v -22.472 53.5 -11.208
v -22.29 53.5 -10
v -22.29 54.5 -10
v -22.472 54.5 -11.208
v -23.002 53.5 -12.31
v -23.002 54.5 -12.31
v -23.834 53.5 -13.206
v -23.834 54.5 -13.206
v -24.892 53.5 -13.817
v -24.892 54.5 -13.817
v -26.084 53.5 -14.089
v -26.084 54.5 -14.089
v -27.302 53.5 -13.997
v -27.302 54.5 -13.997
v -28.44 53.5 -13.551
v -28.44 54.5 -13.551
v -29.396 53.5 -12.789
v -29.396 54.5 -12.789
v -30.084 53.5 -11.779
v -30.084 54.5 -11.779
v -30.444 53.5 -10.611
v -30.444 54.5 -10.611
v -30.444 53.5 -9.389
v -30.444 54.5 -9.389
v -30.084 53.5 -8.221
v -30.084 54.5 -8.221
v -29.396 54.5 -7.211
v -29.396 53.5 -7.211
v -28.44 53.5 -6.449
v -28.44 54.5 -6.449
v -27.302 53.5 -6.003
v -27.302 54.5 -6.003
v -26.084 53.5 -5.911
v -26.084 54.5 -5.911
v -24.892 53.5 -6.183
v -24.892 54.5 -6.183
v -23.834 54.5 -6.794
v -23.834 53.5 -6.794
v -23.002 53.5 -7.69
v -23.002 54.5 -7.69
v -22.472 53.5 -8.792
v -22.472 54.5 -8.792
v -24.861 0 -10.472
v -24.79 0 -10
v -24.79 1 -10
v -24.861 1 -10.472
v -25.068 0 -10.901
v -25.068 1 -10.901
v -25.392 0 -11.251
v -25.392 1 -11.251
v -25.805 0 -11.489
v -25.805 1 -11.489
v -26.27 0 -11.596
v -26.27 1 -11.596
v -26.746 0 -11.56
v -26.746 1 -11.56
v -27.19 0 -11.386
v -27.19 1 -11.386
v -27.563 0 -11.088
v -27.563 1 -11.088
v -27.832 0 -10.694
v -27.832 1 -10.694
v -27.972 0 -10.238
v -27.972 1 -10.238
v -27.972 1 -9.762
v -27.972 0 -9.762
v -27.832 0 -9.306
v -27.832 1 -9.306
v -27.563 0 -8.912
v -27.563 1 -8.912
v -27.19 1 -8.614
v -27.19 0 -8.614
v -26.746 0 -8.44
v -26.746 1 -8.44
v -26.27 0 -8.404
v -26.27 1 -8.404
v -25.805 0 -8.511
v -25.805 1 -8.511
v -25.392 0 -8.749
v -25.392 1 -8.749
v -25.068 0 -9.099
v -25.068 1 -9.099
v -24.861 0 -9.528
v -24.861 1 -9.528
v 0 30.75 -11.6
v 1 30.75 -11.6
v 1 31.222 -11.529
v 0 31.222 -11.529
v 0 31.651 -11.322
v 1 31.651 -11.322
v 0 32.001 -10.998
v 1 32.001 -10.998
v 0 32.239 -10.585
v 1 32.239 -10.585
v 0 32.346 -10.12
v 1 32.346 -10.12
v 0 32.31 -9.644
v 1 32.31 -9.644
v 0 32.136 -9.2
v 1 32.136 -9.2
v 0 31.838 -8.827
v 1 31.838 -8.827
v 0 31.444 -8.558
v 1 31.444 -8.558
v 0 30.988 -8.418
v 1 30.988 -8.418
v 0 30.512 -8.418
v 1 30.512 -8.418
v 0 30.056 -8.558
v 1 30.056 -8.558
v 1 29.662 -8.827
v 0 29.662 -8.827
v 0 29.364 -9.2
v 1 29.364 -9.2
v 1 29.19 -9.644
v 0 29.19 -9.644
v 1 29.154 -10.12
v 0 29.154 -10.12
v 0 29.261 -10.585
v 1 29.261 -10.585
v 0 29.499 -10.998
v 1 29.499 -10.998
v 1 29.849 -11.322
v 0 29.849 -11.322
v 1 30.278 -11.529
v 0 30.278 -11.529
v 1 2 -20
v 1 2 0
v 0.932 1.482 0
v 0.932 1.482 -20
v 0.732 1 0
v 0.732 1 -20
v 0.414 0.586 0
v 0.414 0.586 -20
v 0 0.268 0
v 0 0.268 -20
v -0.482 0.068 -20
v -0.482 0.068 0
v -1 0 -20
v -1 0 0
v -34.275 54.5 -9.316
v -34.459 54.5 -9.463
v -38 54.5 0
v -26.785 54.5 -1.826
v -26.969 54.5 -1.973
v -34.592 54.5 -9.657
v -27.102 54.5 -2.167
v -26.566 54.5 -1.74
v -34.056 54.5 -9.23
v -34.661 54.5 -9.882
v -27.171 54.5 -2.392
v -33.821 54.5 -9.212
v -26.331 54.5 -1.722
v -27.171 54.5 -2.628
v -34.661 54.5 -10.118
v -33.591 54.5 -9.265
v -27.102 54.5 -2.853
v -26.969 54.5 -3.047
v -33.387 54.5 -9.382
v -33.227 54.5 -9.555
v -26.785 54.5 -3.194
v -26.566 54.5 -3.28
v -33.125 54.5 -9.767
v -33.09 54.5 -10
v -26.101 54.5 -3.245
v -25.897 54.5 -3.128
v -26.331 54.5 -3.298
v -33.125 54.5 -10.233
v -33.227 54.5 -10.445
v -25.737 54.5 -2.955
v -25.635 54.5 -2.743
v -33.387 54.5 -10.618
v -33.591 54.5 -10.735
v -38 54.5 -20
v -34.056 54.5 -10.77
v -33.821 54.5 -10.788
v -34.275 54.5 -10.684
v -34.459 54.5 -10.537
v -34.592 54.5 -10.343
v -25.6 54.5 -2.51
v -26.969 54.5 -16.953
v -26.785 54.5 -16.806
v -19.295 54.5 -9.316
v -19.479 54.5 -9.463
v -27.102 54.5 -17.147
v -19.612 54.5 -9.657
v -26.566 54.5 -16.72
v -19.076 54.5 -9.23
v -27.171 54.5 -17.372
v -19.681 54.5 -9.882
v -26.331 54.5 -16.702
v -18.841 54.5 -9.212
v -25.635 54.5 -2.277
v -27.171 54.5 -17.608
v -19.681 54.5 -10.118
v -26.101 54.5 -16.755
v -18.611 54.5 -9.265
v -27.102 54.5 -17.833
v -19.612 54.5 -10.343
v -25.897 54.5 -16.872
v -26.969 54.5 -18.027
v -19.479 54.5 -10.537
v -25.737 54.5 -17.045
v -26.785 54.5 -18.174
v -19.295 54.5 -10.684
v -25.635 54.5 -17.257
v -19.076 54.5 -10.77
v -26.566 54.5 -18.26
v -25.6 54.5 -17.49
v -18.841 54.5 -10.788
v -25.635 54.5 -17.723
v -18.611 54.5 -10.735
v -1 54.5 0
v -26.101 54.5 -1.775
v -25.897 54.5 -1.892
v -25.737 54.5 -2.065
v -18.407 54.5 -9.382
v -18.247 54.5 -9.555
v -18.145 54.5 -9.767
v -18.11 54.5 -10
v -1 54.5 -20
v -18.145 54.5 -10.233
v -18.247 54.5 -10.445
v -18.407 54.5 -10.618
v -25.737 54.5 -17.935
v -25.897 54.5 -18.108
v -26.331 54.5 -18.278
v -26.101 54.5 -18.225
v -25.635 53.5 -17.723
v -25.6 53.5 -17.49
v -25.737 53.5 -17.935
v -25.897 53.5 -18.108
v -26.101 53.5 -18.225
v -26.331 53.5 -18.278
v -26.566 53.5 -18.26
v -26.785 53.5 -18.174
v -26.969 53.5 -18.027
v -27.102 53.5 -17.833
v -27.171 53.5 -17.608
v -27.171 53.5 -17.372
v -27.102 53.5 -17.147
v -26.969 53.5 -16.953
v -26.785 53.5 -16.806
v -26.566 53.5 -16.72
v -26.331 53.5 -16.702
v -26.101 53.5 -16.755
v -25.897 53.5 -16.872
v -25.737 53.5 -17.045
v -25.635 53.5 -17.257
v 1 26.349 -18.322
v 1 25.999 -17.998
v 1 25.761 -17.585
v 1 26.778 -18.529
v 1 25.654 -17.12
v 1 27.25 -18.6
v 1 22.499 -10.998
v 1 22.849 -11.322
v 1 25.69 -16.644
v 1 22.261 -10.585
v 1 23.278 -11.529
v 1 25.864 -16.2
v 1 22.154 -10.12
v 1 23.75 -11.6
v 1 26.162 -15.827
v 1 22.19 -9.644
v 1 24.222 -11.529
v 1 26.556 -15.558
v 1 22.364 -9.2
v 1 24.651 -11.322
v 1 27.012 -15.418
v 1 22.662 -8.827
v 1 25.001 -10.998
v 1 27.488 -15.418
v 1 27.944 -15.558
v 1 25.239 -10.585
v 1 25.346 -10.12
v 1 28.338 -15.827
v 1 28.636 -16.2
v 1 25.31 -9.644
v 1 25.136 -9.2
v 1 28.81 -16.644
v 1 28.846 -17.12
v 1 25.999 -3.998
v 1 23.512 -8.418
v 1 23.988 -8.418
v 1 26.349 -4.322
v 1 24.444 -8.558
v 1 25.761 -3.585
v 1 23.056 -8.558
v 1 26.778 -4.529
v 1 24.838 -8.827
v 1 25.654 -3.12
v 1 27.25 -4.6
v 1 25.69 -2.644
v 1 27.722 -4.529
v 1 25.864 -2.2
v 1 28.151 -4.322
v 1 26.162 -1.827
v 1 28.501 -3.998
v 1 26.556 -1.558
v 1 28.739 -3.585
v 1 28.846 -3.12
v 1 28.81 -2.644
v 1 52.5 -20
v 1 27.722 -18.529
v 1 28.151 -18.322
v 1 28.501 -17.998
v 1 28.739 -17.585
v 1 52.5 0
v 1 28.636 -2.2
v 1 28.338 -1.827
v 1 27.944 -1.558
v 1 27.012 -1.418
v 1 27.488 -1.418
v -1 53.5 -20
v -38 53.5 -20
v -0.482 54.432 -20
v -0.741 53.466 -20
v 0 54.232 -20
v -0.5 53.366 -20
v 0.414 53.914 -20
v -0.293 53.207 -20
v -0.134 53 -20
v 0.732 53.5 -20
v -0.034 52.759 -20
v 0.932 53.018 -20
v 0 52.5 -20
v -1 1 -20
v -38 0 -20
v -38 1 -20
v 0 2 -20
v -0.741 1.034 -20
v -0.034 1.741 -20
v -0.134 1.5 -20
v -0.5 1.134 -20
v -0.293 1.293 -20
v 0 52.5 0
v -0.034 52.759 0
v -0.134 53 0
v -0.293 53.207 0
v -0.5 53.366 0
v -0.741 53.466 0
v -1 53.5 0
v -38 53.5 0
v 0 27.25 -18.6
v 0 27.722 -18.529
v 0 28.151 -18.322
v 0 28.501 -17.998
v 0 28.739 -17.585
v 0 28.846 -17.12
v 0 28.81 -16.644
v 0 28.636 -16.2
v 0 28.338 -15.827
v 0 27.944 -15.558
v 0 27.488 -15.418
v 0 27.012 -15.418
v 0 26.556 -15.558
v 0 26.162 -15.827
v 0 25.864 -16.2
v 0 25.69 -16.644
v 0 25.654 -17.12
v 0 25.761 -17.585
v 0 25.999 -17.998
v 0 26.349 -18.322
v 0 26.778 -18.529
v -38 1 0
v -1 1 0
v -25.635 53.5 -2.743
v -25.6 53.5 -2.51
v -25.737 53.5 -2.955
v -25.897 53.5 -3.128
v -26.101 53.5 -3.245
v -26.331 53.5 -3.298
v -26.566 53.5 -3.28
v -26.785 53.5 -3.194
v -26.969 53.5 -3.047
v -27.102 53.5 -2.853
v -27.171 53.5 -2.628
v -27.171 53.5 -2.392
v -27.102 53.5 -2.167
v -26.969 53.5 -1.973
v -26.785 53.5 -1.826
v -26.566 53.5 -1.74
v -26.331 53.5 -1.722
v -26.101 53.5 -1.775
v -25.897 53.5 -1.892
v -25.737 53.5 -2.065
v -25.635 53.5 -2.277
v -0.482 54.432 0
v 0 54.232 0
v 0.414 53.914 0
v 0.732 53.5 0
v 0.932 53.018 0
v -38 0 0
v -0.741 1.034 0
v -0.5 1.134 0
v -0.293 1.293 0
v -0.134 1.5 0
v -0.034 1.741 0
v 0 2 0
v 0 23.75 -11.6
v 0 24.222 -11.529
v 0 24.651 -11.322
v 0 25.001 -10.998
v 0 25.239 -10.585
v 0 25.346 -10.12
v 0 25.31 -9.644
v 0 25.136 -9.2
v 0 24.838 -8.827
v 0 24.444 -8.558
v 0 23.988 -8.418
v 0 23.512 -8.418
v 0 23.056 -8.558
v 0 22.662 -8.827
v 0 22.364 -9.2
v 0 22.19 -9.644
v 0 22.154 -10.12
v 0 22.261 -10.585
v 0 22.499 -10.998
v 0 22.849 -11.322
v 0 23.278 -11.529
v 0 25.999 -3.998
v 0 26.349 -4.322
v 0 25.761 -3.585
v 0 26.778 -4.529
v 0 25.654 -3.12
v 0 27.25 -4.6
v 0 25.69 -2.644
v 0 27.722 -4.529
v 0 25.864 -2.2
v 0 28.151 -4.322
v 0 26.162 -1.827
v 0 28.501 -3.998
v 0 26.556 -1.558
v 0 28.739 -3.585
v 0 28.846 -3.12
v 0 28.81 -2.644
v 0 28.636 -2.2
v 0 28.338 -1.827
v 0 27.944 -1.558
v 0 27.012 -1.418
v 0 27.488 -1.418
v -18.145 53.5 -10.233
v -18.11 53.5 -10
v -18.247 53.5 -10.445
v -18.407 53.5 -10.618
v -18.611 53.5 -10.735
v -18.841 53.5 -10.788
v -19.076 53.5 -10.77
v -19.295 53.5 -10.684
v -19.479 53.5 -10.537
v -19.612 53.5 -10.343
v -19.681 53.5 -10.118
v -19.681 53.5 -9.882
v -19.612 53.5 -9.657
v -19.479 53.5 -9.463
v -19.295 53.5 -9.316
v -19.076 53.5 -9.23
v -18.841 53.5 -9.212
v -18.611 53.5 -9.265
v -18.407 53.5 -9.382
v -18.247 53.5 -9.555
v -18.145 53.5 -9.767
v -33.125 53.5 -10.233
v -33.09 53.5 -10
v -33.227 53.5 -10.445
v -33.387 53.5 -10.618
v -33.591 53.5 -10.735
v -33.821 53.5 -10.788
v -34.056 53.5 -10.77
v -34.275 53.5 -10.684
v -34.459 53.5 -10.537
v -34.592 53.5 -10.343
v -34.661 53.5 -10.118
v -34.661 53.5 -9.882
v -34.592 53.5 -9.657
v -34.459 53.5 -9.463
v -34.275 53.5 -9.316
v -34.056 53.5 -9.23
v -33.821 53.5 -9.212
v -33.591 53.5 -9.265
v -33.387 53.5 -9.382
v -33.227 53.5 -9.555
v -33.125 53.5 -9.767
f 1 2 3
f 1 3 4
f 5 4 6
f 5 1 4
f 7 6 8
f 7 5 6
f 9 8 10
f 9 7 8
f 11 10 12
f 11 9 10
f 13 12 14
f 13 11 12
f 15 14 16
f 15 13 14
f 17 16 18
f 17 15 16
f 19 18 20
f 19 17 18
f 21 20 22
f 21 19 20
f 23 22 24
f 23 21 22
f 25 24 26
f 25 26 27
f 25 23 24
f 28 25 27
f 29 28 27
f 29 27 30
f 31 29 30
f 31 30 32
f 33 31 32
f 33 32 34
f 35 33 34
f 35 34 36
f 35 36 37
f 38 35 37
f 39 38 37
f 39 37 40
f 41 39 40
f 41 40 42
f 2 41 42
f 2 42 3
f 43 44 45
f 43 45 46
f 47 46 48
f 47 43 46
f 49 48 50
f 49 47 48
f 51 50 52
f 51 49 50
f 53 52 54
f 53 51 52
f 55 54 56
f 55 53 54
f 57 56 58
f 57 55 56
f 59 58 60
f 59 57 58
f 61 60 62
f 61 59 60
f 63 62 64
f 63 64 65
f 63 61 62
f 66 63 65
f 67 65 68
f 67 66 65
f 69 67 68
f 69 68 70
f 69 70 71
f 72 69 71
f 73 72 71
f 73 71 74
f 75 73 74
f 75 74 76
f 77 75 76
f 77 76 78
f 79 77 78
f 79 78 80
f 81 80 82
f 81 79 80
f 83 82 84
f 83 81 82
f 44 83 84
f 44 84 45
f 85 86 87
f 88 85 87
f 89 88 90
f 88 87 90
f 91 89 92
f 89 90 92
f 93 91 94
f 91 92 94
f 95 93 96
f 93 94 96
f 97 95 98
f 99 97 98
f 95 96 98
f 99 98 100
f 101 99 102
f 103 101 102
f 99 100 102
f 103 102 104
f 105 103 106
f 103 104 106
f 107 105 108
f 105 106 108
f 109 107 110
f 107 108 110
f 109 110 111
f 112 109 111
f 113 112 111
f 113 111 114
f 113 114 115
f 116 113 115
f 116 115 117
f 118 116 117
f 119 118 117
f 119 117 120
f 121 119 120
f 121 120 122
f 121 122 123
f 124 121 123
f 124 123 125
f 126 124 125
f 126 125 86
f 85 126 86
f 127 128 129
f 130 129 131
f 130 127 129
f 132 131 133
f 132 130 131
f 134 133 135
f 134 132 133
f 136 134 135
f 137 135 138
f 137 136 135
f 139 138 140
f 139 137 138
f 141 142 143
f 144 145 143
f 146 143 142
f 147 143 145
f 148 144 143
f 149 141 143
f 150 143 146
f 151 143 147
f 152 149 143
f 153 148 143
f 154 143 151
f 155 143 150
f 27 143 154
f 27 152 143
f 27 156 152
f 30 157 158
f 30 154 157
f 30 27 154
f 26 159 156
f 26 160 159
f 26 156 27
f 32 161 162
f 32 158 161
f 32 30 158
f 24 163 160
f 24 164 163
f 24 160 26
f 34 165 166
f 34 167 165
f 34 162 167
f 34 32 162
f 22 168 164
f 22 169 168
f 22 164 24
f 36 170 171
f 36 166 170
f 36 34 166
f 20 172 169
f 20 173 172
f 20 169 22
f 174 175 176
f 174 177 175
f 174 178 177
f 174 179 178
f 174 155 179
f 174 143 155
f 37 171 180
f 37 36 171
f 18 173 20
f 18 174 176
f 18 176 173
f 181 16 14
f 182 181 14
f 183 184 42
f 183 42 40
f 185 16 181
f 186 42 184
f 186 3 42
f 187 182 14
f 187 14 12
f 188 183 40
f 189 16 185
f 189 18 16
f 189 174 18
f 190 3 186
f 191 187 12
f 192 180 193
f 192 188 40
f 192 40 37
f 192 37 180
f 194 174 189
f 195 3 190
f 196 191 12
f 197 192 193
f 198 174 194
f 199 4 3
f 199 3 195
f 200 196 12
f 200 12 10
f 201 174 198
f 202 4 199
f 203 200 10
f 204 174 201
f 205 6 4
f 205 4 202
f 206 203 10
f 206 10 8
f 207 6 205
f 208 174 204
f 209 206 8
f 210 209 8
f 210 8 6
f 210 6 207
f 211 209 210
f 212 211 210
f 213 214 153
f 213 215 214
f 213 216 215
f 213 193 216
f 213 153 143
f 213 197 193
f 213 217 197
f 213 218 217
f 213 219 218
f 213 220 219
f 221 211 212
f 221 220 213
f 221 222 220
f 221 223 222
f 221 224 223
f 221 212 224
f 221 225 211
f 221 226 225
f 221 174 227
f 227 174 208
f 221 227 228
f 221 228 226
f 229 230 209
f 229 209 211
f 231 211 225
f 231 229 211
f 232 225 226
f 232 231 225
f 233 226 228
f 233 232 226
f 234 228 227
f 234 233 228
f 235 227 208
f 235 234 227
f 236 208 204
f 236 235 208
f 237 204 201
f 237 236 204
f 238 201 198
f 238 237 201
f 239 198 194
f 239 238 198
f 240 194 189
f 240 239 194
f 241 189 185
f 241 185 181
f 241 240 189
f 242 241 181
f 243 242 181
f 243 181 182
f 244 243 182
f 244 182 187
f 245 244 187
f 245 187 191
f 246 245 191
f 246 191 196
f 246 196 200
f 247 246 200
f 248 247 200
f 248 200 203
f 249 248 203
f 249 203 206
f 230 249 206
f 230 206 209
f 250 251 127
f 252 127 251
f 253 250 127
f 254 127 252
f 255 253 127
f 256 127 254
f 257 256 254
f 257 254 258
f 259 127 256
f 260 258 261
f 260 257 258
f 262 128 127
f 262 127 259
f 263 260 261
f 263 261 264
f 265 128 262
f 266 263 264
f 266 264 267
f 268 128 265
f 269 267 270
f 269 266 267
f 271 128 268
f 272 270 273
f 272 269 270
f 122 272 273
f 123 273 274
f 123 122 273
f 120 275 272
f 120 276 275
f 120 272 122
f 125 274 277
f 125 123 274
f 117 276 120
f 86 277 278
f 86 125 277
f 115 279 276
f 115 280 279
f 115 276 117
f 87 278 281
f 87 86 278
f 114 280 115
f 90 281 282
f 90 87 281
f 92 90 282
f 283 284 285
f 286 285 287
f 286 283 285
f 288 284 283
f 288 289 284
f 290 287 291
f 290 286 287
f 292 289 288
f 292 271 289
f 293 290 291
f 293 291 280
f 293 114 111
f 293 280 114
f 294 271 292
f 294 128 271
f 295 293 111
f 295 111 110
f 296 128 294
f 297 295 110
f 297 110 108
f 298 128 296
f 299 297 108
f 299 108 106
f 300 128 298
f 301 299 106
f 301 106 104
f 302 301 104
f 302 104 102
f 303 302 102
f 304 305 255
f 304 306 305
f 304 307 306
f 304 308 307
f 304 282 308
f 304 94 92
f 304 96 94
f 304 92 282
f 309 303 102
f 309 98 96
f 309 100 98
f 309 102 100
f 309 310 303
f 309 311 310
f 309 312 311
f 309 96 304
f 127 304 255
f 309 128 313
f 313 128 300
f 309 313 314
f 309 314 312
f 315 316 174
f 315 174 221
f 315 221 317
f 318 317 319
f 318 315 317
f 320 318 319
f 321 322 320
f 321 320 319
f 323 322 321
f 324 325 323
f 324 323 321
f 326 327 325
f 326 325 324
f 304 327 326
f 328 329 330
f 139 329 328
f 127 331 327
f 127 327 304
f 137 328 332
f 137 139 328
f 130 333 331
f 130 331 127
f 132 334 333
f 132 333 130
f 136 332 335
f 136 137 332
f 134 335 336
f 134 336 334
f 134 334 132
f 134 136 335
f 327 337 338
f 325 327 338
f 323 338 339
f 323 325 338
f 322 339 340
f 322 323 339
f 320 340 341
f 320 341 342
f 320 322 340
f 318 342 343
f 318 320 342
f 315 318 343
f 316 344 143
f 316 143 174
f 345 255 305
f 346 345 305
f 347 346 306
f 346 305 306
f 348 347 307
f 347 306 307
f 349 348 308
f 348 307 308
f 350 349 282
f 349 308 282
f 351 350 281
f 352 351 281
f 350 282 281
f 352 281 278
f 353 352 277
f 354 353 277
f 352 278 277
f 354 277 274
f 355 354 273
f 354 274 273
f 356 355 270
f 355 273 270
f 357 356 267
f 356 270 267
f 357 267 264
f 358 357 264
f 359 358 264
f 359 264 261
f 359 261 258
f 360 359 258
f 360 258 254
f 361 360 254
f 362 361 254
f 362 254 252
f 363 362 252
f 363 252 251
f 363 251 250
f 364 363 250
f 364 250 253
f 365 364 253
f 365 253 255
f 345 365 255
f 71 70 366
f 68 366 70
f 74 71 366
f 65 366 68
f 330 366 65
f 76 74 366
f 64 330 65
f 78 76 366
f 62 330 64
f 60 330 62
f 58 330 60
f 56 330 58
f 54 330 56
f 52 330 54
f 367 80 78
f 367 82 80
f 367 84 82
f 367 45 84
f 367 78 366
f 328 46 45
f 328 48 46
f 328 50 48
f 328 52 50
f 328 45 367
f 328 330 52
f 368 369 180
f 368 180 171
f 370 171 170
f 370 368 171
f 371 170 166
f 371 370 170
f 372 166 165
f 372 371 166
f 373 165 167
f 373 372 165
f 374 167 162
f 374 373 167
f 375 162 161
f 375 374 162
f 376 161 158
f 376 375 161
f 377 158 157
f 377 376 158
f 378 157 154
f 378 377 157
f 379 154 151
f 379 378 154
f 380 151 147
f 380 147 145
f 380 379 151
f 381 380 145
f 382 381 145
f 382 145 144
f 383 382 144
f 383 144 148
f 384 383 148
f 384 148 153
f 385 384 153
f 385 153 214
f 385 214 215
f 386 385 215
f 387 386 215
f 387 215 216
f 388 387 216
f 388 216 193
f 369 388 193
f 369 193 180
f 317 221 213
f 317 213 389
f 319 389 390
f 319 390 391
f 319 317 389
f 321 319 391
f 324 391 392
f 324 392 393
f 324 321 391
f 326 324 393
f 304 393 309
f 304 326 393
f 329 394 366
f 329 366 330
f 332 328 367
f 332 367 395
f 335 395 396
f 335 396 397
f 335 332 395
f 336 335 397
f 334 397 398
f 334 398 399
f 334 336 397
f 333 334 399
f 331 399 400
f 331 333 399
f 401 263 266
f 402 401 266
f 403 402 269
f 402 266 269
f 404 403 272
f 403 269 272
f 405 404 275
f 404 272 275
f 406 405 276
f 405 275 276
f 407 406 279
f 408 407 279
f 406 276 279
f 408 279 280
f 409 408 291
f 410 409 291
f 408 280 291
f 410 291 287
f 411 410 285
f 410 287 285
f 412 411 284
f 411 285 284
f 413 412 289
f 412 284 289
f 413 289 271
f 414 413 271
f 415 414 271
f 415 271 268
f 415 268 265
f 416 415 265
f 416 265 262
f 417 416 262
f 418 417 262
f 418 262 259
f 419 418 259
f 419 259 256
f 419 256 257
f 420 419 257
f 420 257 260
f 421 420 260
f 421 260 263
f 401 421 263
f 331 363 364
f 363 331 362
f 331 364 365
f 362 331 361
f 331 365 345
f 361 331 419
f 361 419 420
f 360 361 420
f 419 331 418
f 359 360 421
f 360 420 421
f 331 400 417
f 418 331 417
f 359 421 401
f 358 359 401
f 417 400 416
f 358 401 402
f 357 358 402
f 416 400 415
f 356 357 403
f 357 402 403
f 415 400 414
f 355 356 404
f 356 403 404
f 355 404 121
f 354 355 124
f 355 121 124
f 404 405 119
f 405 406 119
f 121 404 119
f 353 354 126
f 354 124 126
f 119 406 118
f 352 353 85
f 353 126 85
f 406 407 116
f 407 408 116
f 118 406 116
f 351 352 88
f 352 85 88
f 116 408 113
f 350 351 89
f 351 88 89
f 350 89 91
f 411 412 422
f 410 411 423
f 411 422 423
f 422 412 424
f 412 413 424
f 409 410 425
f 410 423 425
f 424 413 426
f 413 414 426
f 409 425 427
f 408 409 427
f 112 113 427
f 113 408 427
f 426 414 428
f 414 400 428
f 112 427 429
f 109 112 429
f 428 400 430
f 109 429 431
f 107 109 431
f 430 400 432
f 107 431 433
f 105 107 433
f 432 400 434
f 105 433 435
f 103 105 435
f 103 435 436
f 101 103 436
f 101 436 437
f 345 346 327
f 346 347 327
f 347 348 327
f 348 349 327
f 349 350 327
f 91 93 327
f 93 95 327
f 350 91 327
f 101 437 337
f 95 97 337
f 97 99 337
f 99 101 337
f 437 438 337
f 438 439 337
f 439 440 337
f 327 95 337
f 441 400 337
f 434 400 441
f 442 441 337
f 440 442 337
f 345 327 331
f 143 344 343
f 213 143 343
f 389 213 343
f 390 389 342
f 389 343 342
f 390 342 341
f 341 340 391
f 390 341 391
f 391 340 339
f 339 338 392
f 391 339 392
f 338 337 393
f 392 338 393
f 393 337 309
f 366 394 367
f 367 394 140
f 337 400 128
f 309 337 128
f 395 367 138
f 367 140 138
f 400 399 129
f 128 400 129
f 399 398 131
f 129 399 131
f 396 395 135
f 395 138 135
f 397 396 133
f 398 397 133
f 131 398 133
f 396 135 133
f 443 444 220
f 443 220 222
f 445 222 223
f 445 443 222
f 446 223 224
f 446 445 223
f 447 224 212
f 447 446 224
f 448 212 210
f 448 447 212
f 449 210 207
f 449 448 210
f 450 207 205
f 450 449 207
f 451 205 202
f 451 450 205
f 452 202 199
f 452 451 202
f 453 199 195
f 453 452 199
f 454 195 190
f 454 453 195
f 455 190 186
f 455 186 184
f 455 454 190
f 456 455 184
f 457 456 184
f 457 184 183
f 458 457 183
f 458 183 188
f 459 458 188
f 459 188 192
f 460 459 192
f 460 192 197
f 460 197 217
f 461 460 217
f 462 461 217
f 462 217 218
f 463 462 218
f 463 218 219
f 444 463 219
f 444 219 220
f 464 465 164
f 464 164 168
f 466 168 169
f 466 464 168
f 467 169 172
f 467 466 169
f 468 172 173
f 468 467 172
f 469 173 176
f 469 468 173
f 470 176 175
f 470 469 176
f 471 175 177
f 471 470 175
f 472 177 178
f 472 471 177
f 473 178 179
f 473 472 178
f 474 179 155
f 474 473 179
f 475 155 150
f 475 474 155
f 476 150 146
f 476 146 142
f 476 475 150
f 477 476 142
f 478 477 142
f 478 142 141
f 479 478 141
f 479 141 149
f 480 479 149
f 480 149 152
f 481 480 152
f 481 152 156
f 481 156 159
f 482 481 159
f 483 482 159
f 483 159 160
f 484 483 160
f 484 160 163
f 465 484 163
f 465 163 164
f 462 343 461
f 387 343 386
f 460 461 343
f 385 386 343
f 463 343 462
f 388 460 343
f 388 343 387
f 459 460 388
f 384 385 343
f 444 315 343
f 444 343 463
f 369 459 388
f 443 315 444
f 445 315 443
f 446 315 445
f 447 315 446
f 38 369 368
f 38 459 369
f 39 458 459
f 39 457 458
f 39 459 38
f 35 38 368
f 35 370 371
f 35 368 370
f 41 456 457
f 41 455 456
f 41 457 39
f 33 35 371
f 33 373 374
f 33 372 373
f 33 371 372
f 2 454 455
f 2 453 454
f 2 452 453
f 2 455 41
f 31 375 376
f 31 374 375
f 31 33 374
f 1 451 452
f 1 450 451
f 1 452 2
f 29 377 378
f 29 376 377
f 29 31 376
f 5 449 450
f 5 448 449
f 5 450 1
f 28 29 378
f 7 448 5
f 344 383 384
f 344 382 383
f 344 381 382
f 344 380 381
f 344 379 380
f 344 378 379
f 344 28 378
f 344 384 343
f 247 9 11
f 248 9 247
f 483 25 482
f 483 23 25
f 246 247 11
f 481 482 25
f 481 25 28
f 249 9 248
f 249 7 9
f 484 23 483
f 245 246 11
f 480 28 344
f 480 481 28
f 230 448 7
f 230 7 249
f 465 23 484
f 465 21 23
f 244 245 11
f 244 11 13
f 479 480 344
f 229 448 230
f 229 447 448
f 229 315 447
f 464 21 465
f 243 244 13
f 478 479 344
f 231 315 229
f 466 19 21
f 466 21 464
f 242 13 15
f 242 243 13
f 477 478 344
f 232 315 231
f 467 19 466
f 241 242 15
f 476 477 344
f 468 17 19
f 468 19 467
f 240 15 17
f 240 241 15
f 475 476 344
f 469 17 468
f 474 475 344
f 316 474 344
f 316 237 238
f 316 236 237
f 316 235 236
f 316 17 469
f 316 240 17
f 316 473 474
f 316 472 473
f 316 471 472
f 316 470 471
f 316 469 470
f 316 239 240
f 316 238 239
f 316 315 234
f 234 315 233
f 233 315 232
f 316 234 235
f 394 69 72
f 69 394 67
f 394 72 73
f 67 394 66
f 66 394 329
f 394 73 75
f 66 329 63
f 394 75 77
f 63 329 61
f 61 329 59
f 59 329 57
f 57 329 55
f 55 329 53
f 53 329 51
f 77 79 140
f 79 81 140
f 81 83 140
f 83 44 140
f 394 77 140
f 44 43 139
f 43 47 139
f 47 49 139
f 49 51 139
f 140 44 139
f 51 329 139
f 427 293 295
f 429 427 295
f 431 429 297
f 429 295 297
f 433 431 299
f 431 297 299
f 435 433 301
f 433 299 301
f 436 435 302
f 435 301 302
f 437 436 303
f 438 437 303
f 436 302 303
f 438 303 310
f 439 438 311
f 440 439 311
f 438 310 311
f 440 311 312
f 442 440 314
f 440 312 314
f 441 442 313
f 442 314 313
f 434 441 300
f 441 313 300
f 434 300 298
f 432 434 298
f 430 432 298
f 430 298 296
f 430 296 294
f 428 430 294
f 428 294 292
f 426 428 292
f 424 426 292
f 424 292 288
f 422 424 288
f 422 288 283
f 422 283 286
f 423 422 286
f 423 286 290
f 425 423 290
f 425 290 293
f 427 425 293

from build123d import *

# Parameters (mm, degrees)
SKETCH_1_W                    = 20
SKETCH_1_H                    = 54.5
EXTRUDE_1_DEPTH               = 1
SKETCH_2_W                    = 20
SKETCH_2_H                    = 1
EXTRUDE_2_DEPTH               = 38
SKETCH_3_W                    = 20
SKETCH_3_H                    = 1
EXTRUDE_3_DEPTH               = 38
SKETCH_4_R                    = 4.1
CUT_EXTRUDE_1_DEPTH           = 1
SKETCH_5_R                    = 0.79
CUT_EXTRUDE_2_DEPTH           = 1
SKETCH_6_R                    = 0.79
CUT_EXTRUDE_3_DEPTH           = 1
SKETCH_7_R                    = 0.79
CUT_EXTRUDE_4_DEPTH           = 1
SKETCH_8_R                    = 0.79
CUT_EXTRUDE_5_DEPTH           = 1
SKETCH_9_R                    = 1.6
CUT_EXTRUDE_6_DEPTH           = 1
CUT_EXTRUDE_7_REACH           = 71.937
SKETCH_10_R                   = 1.6
CUT_EXTRUDE_8_REACH           = 71.937
SKETCH_11_R                   = 1.6
CUT_EXTRUDE_9_REACH           = 71.937
SKETCH_12_R                   = 1.6
CUT_EXTRUDE_10_REACH          = 71.937
SKETCH_14_R                   = 1.6
SHEET_START                   = -38
SHEET_METAL_1_OUTLINE_W       = 1
SHEET_METAL_1_OUTLINE_H       = 20
SHEET_METAL_1_DEPTH           = 38
SHEET_METAL_1_2_OUTLINE_W     = 37.35619449
SHEET_METAL_1_2_OUTLINE_H     = 20
SHEET_METAL_1_2_OUTLINE_R     = 0.79
SHEET_METAL_1_2_OUTLINE_R_2   = 4.1
SHEET_METAL_1_2_OUTLINE_R_3   = 1.6
SHEET_METAL_1_2_DEPTH         = 1
SHEET_START_2                 = 54.28876
SHEET_METAL_1_3_OUTLINE_W     = 1
SHEET_METAL_1_3_OUTLINE_H     = 20
SHEET_METAL_1_3_DEPTH         = 37.56743449
SHEET_START_3                 = -37.35619449
SHEET_METAL_1_3_2_OUTLINE_W   = 1
SHEET_METAL_1_3_2_OUTLINE_H   = 20
SHEET_METAL_1_3_2_DEPTH       = 37.55071449
SHEET_METAL_1_3_3_OUTLINE_R   = 4.1
SHEET_METAL_1_3_3_OUTLINE_R_2 = 1.6
SHEET_METAL_1_3_3_OUTLINE_R_3 = 0.79
SHEET_METAL_1_3_3_DEPTH       = 1
SHEET_METAL_1_3_4_OUTLINE_W   = 38
SHEET_METAL_1_3_4_OUTLINE_H   = 20
SHEET_METAL_1_3_4_OUTLINE_R   = 0.79
SHEET_METAL_1_3_4_OUTLINE_R_2 = 4.1
SHEET_METAL_1_3_4_DEPTH       = 2
SHEET_START_4                 = 52.5
SHEET_METAL_1_3_5_OUTLINE_W   = 38
SHEET_METAL_1_3_5_OUTLINE_H   = 20
SHEET_METAL_1_3_5_OUTLINE_R   = 0.79
SHEET_METAL_1_3_5_OUTLINE_R_2 = 4.1
SHEET_METAL_1_3_5_DEPTH       = 2
SHEET_START_5                 = -20
SHEET_METAL_1_3_6_DEPTH       = 20


with BuildPart() as part:
    # Sketch 1 → ﾎﾞｽ - 押し出し1 (new body)
    with BuildSketch(Plane(origin=(0, 0, 0), x_dir=(0, 0, -1), z_dir=(1, 0, 0))):
        with Locations((10, 27.25)):
            Rectangle(SKETCH_1_W, SKETCH_1_H)
    extrude(amount=EXTRUDE_1_DEPTH)

    # Sketch 2 → ﾎﾞｽ - 押し出し2 (add)
    with BuildSketch(Plane.ZY):
        with Locations((-10, 54)):
            Rectangle(SKETCH_2_W, SKETCH_2_H)
    extrude(amount=EXTRUDE_2_DEPTH)

    # ｽｹｯﾁ3 → ﾎﾞｽ - 押し出し3 (add)
    with BuildSketch(Plane.ZY):
        with Locations((-10, 0.5)):
            Rectangle(SKETCH_3_W, SKETCH_3_H)
    extrude(amount=EXTRUDE_3_DEPTH)

    # ｽｹｯﾁ4 → ｶｯﾄ - 押し出し1 (cut)
    with BuildSketch(Plane(origin=(0, 54.5, 0), x_dir=(1, 0, 0), z_dir=(0, 1, 0))):
        with Locations(Location((-26.39, 10, 0), (0, 0, 270))):
            Circle(SKETCH_4_R)
    extrude(amount=-CUT_EXTRUDE_1_DEPTH, mode=Mode.SUBTRACT)

    # ｽｹｯﾁ5 → ｶｯﾄ - 押し出し2 (cut)
    with BuildSketch(Plane(origin=(0, 54.5, 0), x_dir=(1, 0, 0), z_dir=(0, 1, 0))):
        with Locations(Location((-33.88, 10, 0), (0, 0, 270))):
            Circle(SKETCH_5_R)
    extrude(amount=-CUT_EXTRUDE_2_DEPTH, mode=Mode.SUBTRACT)

    # ｽｹｯﾁ6 → ｶｯﾄ - 押し出し3 (cut)
    with BuildSketch(Plane(origin=(0, 54.5, 0), x_dir=(1, 0, 0), z_dir=(0, 1, 0))):
        with Locations(Location((-18.9, 10, 0), (0, 0, 270))):
            Circle(SKETCH_6_R)
    extrude(amount=-CUT_EXTRUDE_3_DEPTH, mode=Mode.SUBTRACT)

    # ｽｹｯﾁ7 → ｶｯﾄ - 押し出し4 (cut)
    with BuildSketch(Plane(origin=(0, 54.5, 0), x_dir=(1, 0, 0), z_dir=(0, 1, 0))):
        with Locations(Location((-26.39, 2.51, 0), (0, 0, 270))):
            Circle(SKETCH_7_R)
    extrude(amount=-CUT_EXTRUDE_4_DEPTH, mode=Mode.SUBTRACT)

    # ｽｹｯﾁ8 → ｶｯﾄ - 押し出し5 (cut)
    with BuildSketch(Plane(origin=(0, 54.5, 0), x_dir=(1, 0, 0), z_dir=(0, 1, 0))):
        with Locations(Location((-26.39, 17.49, 0), (0, 0, 270))):
            Circle(SKETCH_8_R)
    extrude(amount=-CUT_EXTRUDE_5_DEPTH, mode=Mode.SUBTRACT)

    # ｽｹｯﾁ9 → ｶｯﾄ - 押し出し6 (cut)
    with BuildSketch(Plane(origin=(0, 0, 0), x_dir=(-1, 0, 0), z_dir=(0, -1, 0))):
        with Locations(Location((26.39, 10, 0), (0, 0, 90))):
            Circle(SKETCH_9_R)
    extrude(amount=-CUT_EXTRUDE_6_DEPTH, mode=Mode.SUBTRACT)

    # ｽｹｯﾁ10 → ｶｯﾄ - 押し出し7 (cut, up to next)
    with BuildSketch(Plane(origin=(1, 0, 0), x_dir=(0, 0, -1), z_dir=(1, 0, 0)), mode=Mode.PRIVATE) as cut_extrude_7_sk1:
        with Locations((17, 27.25)):
            Circle(SKETCH_10_R)
    cut_extrude_7_tool1 = extrude(cut_extrude_7_sk1.sketch, amount=-CUT_EXTRUDE_7_REACH, mode=Mode.PRIVATE) & part.part
    add(cut_extrude_7_tool1.solids().sort_by_distance((1, 27.25, -17))[0], mode=Mode.SUBTRACT)

    # ｽｹｯﾁ11 → ｶｯﾄ - 押し出し8 (cut, up to next)
    with BuildSketch(Plane(origin=(1, 0, 0), x_dir=(0, 0, -1), z_dir=(1, 0, 0)), mode=Mode.PRIVATE) as cut_extrude_8_sk1:
        with Locations((3, 27.25)):
            Circle(SKETCH_11_R)
    cut_extrude_8_tool1 = extrude(cut_extrude_8_sk1.sketch, amount=-CUT_EXTRUDE_8_REACH, mode=Mode.PRIVATE) & part.part
    add(cut_extrude_8_tool1.solids().sort_by_distance((1, 27.25, -3))[0], mode=Mode.SUBTRACT)

    # ｽｹｯﾁ12 → ｶｯﾄ - 押し出し9 (cut, up to next)
    with BuildSketch(Plane(origin=(1, 0, 0), x_dir=(0, 0, -1), z_dir=(1, 0, 0)), mode=Mode.PRIVATE) as cut_extrude_9_sk1:
        with Locations((10, 23.75)):
            Circle(SKETCH_12_R)
    cut_extrude_9_tool1 = extrude(cut_extrude_9_sk1.sketch, amount=-CUT_EXTRUDE_9_REACH, mode=Mode.PRIVATE) & part.part
    add(cut_extrude_9_tool1.solids().sort_by_distance((1, 23.75, -10))[0], mode=Mode.SUBTRACT)

    # ｽｹｯﾁ14 → ｶｯﾄ - 押し出し10 (cut, up to next)
    with BuildSketch(Plane(origin=(1, 0, 0), x_dir=(0, 0, -1), z_dir=(1, 0, 0)), mode=Mode.PRIVATE) as cut_extrude_10_sk1:
        with Locations((10, 30.75)):
            Circle(SKETCH_14_R)
    cut_extrude_10_tool1 = extrude(cut_extrude_10_sk1.sketch, amount=-CUT_EXTRUDE_10_REACH, mode=Mode.PRIVATE) & part.part
    add(cut_extrude_10_tool1.solids().sort_by_distance((1, 30.75, -10))[0], mode=Mode.SUBTRACT)

    # Sheet Metal 1: read off the stored shape, not the designer's step
    # Sheet Metal 1 outline → Sheet Metal 1 (cut)
    with BuildSketch(Plane.YZ.offset(SHEET_START)):
        with Locations((54, -10)):
            Rectangle(SHEET_METAL_1_OUTLINE_W, SHEET_METAL_1_OUTLINE_H)
        with Locations((0.5, -10)):
            Rectangle(SHEET_METAL_1_OUTLINE_W, SHEET_METAL_1_OUTLINE_H)
    extrude(amount=SHEET_METAL_1_DEPTH, mode=Mode.SUBTRACT)

    # Sheet Metal 1 2 outline → Sheet Metal 1 2 (add)
    # profile 1 of 2: a face of its own
    with BuildSketch(Plane.YZ):
        with Locations((73.178097245, -10)):
            Rectangle(SHEET_METAL_1_2_OUTLINE_W, SHEET_METAL_1_2_OUTLINE_H)
        with Locations((80.24619449, -17.49)):
            Circle(SHEET_METAL_1_2_OUTLINE_R, mode=Mode.SUBTRACT)
        with Locations((72.75619449, -10)):
            Circle(SHEET_METAL_1_2_OUTLINE_R, mode=Mode.SUBTRACT)
        with Locations((80.24619449, -10)):
            Circle(SHEET_METAL_1_2_OUTLINE_R_2, mode=Mode.SUBTRACT)
        with Locations((87.73619449, -10)):
            Circle(SHEET_METAL_1_2_OUTLINE_R, mode=Mode.SUBTRACT)
        with Locations((80.24619449, -2.51)):
            Circle(SHEET_METAL_1_2_OUTLINE_R, mode=Mode.SUBTRACT)
    # profile 2 of 2: a face of its own
    with BuildSketch(Plane.YZ):
        with Locations((-18.678097245, -10)):
            Rectangle(SHEET_METAL_1_2_OUTLINE_W, SHEET_METAL_1_2_OUTLINE_H)
        with Locations((-25.74619449, -10)):
            Circle(SHEET_METAL_1_2_OUTLINE_R_3, mode=Mode.SUBTRACT)
    extrude(amount=SHEET_METAL_1_2_DEPTH)

    # Sheet Metal 1 3: read off the stored shape, not the designer's step
    # Sheet Metal 1 3 outline → Sheet Metal 1 3 (cut)
    with BuildSketch(Plane(origin=(0, 0, 0), x_dir=(1, 0, 0), z_dir=(0, 1, 0)).offset(SHEET_START_2)):
        with Locations((0.5, 10)):
            Rectangle(SHEET_METAL_1_3_OUTLINE_W, SHEET_METAL_1_3_OUTLINE_H)
    extrude(amount=SHEET_METAL_1_3_DEPTH, mode=Mode.SUBTRACT)

    # Sheet Metal 1 3 2 outline → Sheet Metal 1 3 2 (cut)
    with BuildSketch(Plane(origin=(0, 0, 0), x_dir=(1, 0, 0), z_dir=(0, 1, 0)).offset(SHEET_START_3)):
        with Locations((0.5, 10)):
            Rectangle(SHEET_METAL_1_3_2_OUTLINE_W, SHEET_METAL_1_3_2_OUTLINE_H)
    extrude(amount=SHEET_METAL_1_3_2_DEPTH, mode=Mode.SUBTRACT)



with BuildPart() as body_2:
    # Sheet Metal 1 3 3 outline → Sheet Metal 1 3 3 (new body)
    # profile 1 of 5: a face of its own
    with BuildSketch(Plane(origin=(0, 0, 0), x_dir=(1, 0, 0), z_dir=(0, 1, 0))):
        with Locations((-26.39, 10)):
            Circle(SHEET_METAL_1_3_3_OUTLINE_R)
        with Locations((-26.39, 10)):
            Circle(SHEET_METAL_1_3_3_OUTLINE_R_2, mode=Mode.SUBTRACT)
    # profile 2 of 5: a face of its own
    with BuildSketch(Plane(origin=(0, 0, 0), x_dir=(1, 0, 0), z_dir=(0, 1, 0))):
        with Locations((-33.88, 10)):
            Circle(SHEET_METAL_1_3_3_OUTLINE_R_3)
    # profile 3 of 5: a face of its own
    with BuildSketch(Plane(origin=(0, 0, 0), x_dir=(1, 0, 0), z_dir=(0, 1, 0))):
        with Locations((-18.9, 10)):
            Circle(SHEET_METAL_1_3_3_OUTLINE_R_3)
    # profile 4 of 5: a face of its own
    with BuildSketch(Plane(origin=(0, 0, 0), x_dir=(1, 0, 0), z_dir=(0, 1, 0))):
        with Locations((-26.39, 2.51)):
            Circle(SHEET_METAL_1_3_3_OUTLINE_R_3)
    # profile 5 of 5: a face of its own
    with BuildSketch(Plane(origin=(0, 0, 0), x_dir=(1, 0, 0), z_dir=(0, 1, 0))):
        with Locations((-26.39, 17.49)):
            Circle(SHEET_METAL_1_3_3_OUTLINE_R_3)
    extrude(amount=SHEET_METAL_1_3_3_DEPTH)


with BuildPart() as part_1:
    add(part.part)

    add(body_2.part)  # Sheet Metal 1 3 4 merges body 2
    # Sheet Metal 1 3 4 outline → Sheet Metal 1 3 4 (add)
    with BuildSketch(Plane(origin=(0, 0, 0), x_dir=(1, 0, 0), z_dir=(0, 1, 0))):
        with Locations((-19, 10)):
            Rectangle(SHEET_METAL_1_3_4_OUTLINE_W, SHEET_METAL_1_3_4_OUTLINE_H)
        with Locations((-26.39, 2.51)):
            Circle(SHEET_METAL_1_3_4_OUTLINE_R, mode=Mode.SUBTRACT)
        with Locations((-33.88, 10)):
            Circle(SHEET_METAL_1_3_4_OUTLINE_R, mode=Mode.SUBTRACT)
        with Locations((-26.39, 10)):
            Circle(SHEET_METAL_1_3_4_OUTLINE_R_2, mode=Mode.SUBTRACT)
        with Locations((-18.9, 10)):
            Circle(SHEET_METAL_1_3_4_OUTLINE_R, mode=Mode.SUBTRACT)
        with Locations((-26.39, 17.49)):
            Circle(SHEET_METAL_1_3_4_OUTLINE_R, mode=Mode.SUBTRACT)
    extrude(amount=SHEET_METAL_1_3_4_DEPTH)

    # Sheet Metal 1 3 5 outline → Sheet Metal 1 3 5 (add)
    with BuildSketch(Plane(origin=(0, 0, 0), x_dir=(1, 0, 0), z_dir=(0, 1, 0)).offset(SHEET_START_4)):
        with Locations((-19, 10)):
            Rectangle(SHEET_METAL_1_3_5_OUTLINE_W, SHEET_METAL_1_3_5_OUTLINE_H)
        with Locations((-26.39, 2.51)):
            Circle(SHEET_METAL_1_3_5_OUTLINE_R, mode=Mode.SUBTRACT)
        with Locations((-33.88, 10)):
            Circle(SHEET_METAL_1_3_5_OUTLINE_R, mode=Mode.SUBTRACT)
        with Locations((-26.39, 10)):
            Circle(SHEET_METAL_1_3_5_OUTLINE_R_2, mode=Mode.SUBTRACT)
        with Locations((-18.9, 10)):
            Circle(SHEET_METAL_1_3_5_OUTLINE_R, mode=Mode.SUBTRACT)
        with Locations((-26.39, 17.49)):
            Circle(SHEET_METAL_1_3_5_OUTLINE_R, mode=Mode.SUBTRACT)
    extrude(amount=SHEET_METAL_1_3_5_DEPTH)

    # Sheet Metal 1 3 6 outline → Sheet Metal 1 3 6 (cut)
    with BuildSketch(Plane.XY.offset(SHEET_START_5)):
        with BuildLine():
            Line((-38, 2), (-38, 1))
            Line((-38, 1), (-1, 1))
            ThreePointArc((-1, 1), (-0.292893219, 1.292893219), (0, 2))
            Line((0, 2), (-38, 2))
        make_face()
        with BuildLine():
            Line((-1, 53.5), (-38, 53.5))
            Line((-38, 53.5), (-38, 52.5))
            Line((-38, 52.5), (0, 52.5))
            ThreePointArc((0, 52.5), (-0.292893219, 53.207106781), (-1, 53.5))
        make_face()
        with BuildLine():
            ThreePointArc((-1, 54.5), (0.414213562, 53.914213562), (1, 52.5))
            Line((1, 52.5), (1, 54.28876))
            Line((1, 54.28876), (0, 54.28876))
            Line((0, 54.28876), (0, 54.5))
            Line((0, 54.5), (-1, 54.5))
        make_face()
        with BuildLine():
            ThreePointArc((1, 2), (0.414213562, 0.585786438), (-1, 0))
            Line((-1, 0), (0, 0))
            Line((0, 0), (0, 0.19452))
            Line((0, 0.19452), (1, 0.19452))
            Line((1, 0.19452), (1, 2))
        make_face()
    extrude(amount=SHEET_METAL_1_3_6_DEPTH, mode=Mode.SUBTRACT)


solid = part_1.part
